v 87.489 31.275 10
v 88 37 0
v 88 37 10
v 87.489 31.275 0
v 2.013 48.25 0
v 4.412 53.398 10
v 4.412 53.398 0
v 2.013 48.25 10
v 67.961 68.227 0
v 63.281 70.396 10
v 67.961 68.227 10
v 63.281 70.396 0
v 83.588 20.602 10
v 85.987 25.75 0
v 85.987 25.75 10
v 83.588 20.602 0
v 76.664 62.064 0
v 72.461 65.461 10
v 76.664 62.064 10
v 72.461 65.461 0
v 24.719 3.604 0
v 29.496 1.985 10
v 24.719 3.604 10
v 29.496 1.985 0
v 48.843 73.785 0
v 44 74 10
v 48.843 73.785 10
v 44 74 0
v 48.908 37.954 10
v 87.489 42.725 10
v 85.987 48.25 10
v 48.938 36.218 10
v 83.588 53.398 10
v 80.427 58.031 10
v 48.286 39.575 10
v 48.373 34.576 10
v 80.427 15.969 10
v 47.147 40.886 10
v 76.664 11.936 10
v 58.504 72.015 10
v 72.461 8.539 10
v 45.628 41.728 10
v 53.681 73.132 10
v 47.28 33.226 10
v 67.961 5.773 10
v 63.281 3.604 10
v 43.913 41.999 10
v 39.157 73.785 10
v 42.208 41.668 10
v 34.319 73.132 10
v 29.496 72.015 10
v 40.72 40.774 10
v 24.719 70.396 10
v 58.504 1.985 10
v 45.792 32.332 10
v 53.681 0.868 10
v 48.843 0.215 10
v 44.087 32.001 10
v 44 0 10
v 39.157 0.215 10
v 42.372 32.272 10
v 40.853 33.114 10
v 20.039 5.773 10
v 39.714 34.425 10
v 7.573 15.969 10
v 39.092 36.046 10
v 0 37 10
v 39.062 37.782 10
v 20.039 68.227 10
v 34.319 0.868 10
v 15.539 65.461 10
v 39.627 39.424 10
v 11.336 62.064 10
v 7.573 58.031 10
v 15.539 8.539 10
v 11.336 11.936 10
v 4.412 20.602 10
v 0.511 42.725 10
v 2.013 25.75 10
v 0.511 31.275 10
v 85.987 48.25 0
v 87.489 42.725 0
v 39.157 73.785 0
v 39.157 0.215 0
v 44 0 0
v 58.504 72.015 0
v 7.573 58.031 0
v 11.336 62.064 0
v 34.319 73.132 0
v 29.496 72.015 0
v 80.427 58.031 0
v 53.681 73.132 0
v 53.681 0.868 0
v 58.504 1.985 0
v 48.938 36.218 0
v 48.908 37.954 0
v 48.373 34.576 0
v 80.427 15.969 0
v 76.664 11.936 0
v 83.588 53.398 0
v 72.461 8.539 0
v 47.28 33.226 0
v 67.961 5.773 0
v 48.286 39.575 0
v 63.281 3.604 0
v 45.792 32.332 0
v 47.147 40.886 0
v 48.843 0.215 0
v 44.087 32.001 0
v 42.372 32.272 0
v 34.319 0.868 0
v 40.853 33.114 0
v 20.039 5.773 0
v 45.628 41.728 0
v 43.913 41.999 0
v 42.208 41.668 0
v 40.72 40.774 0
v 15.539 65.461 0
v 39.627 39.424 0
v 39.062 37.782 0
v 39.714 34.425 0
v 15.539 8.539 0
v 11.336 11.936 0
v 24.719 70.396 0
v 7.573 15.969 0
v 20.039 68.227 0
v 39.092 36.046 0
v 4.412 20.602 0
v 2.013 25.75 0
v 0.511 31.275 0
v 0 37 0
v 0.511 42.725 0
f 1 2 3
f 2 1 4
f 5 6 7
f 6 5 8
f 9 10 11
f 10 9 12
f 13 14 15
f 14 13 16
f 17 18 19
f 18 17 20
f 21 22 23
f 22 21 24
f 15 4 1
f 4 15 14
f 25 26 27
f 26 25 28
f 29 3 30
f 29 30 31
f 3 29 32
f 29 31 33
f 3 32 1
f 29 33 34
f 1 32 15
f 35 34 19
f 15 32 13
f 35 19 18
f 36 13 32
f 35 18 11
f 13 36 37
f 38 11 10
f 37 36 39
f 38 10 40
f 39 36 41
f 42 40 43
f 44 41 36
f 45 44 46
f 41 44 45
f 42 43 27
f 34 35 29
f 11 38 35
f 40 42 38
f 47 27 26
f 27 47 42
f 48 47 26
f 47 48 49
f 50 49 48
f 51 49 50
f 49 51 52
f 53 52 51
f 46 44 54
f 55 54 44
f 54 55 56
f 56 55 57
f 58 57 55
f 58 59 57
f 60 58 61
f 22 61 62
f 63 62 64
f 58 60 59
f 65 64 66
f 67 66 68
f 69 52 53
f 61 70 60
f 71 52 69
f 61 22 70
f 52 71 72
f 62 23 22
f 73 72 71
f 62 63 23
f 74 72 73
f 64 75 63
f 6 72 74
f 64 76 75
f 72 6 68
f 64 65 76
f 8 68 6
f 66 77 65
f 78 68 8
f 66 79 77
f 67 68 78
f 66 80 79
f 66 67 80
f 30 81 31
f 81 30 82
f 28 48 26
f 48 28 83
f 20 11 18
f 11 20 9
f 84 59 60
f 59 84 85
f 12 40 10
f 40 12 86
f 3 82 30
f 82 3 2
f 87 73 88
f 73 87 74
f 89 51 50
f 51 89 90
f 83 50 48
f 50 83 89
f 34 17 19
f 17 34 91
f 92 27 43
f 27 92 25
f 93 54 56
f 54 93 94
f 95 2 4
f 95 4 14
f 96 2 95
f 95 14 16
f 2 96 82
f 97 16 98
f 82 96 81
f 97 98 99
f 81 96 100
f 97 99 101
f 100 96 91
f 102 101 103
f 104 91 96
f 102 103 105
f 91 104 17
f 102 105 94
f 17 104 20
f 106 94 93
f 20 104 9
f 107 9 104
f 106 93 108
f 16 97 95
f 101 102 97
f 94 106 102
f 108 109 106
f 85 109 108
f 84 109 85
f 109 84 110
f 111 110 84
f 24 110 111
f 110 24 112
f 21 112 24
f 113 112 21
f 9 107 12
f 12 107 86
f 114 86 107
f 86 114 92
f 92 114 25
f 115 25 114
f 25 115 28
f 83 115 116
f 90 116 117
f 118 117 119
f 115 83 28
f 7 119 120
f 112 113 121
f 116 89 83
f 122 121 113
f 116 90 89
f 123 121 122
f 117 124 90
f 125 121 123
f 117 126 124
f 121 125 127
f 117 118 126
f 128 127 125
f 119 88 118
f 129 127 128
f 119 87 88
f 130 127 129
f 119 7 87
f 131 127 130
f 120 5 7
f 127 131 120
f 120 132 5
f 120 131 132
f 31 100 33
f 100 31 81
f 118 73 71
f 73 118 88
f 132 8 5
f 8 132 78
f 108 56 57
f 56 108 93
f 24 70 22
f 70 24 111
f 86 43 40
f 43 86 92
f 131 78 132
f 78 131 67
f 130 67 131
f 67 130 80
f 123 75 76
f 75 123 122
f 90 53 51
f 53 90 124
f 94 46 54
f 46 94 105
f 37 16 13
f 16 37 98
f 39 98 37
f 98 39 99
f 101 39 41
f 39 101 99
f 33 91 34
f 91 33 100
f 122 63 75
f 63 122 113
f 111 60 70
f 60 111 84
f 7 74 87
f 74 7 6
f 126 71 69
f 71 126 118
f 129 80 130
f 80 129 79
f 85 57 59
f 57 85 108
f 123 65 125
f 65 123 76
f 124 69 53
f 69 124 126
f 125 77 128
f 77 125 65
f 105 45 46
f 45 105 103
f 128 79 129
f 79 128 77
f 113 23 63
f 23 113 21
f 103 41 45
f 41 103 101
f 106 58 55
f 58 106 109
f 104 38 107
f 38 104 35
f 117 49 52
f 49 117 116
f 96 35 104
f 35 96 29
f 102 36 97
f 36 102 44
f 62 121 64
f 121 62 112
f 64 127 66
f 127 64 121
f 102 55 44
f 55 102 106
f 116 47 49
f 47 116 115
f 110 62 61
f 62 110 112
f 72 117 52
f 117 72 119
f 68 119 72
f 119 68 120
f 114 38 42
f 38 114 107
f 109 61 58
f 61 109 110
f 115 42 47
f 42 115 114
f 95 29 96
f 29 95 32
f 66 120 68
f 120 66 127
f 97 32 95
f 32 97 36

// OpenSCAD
$fn = 32;

// ----------------------------------------------------------------------
// Cam plate: double_lobe cam, base R36
// ----------------------------------------------------------------------

// --- parameters (mm) ---
base_r = 36;              // base circle radius
lobe_h = 8;               // cam lobe rise
bore_r = 5;               // shaft bore radius
plate_t = 10;             // plate thickness, Z (extrusion height)

profile = [[88, 37], [87.489, 42.725], [85.987, 48.25], [83.588, 53.398], [80.427, 58.031], [76.664, 62.064], [72.461, 65.461], [67.961, 68.227], [63.281, 70.396], [58.504, 72.015], [53.681, 73.132], [48.843, 73.785], [44, 74], [39.157, 73.785], [34.319, 73.132], [29.496, 72.015], [24.719, 70.396], [20.039, 68.227], [15.539, 65.461], [11.336, 62.064], [7.573, 58.031], [4.412, 53.398], [2.013, 48.25], [0.511, 42.725], [0, 37], [0.511, 31.275], [2.013, 25.75], [4.412, 20.602], [7.573, 15.969], [11.336, 11.936], [15.539, 8.539], [20.039, 5.773], [24.719, 3.604], [29.496, 1.985], [34.319, 0.868], [39.157, 0.215], [44, 0], [48.843, 0.215], [53.681, 0.868], [58.504, 1.985], [63.281, 3.604], [67.961, 5.773], [72.461, 8.539], [76.664, 11.936], [80.427, 15.969], [83.588, 20.602], [85.987, 25.75], [87.489, 31.275]];  // primary outline, 48 points, counter clockwise
void_1 = [[48.908, 37.954], [48.286, 39.575], [47.147, 40.886], [45.628, 41.728], [43.913, 41.999], [42.208, 41.668], [40.72, 40.774], [39.627, 39.424], [39.062, 37.782], [39.092, 36.046], [39.714, 34.425], [40.853, 33.114], [42.372, 32.272], [44.087, 32.001], [45.792, 32.332], [47.28, 33.226], [48.373, 34.576], [48.938, 36.218]];  // shaft bore, 18 points

// --- the one profile operation ---
difference() {
  linear_extrude(height = plate_t) polygon(points = profile);
  translate([0, 0, -1])
    linear_extrude(height = plate_t + 2) polygon(points = void_1);
}
